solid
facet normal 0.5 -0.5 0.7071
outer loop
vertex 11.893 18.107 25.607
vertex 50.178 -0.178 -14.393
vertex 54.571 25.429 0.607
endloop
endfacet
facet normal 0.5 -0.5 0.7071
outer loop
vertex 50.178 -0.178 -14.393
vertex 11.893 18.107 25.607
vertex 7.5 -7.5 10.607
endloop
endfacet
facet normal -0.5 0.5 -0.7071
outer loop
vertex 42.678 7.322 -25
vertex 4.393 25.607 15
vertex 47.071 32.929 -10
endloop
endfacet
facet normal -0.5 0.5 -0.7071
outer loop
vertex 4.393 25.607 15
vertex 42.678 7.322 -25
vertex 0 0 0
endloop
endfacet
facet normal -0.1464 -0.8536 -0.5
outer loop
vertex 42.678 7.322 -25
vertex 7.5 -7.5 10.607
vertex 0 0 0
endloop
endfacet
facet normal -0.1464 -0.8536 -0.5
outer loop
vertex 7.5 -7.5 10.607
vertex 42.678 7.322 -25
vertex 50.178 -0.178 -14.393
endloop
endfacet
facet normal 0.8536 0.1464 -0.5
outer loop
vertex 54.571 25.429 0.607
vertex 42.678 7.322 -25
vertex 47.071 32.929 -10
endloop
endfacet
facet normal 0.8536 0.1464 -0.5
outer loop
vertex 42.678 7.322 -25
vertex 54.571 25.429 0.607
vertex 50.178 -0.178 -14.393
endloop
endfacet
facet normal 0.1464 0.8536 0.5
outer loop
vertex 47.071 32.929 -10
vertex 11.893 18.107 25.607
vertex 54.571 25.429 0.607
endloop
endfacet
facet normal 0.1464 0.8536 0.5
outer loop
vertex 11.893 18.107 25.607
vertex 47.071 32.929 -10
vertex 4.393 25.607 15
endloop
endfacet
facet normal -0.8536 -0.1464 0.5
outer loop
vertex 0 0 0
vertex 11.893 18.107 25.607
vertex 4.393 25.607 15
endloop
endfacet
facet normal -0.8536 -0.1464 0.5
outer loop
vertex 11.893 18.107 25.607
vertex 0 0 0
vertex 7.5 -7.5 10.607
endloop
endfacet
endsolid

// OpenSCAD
// Unit of length: Unit.MM
rotate(a = 45.0, v = [1.0, 1.0, 0.0])
{
   cube(size = [50.0, 30.0, 15.0], center = false);
}
